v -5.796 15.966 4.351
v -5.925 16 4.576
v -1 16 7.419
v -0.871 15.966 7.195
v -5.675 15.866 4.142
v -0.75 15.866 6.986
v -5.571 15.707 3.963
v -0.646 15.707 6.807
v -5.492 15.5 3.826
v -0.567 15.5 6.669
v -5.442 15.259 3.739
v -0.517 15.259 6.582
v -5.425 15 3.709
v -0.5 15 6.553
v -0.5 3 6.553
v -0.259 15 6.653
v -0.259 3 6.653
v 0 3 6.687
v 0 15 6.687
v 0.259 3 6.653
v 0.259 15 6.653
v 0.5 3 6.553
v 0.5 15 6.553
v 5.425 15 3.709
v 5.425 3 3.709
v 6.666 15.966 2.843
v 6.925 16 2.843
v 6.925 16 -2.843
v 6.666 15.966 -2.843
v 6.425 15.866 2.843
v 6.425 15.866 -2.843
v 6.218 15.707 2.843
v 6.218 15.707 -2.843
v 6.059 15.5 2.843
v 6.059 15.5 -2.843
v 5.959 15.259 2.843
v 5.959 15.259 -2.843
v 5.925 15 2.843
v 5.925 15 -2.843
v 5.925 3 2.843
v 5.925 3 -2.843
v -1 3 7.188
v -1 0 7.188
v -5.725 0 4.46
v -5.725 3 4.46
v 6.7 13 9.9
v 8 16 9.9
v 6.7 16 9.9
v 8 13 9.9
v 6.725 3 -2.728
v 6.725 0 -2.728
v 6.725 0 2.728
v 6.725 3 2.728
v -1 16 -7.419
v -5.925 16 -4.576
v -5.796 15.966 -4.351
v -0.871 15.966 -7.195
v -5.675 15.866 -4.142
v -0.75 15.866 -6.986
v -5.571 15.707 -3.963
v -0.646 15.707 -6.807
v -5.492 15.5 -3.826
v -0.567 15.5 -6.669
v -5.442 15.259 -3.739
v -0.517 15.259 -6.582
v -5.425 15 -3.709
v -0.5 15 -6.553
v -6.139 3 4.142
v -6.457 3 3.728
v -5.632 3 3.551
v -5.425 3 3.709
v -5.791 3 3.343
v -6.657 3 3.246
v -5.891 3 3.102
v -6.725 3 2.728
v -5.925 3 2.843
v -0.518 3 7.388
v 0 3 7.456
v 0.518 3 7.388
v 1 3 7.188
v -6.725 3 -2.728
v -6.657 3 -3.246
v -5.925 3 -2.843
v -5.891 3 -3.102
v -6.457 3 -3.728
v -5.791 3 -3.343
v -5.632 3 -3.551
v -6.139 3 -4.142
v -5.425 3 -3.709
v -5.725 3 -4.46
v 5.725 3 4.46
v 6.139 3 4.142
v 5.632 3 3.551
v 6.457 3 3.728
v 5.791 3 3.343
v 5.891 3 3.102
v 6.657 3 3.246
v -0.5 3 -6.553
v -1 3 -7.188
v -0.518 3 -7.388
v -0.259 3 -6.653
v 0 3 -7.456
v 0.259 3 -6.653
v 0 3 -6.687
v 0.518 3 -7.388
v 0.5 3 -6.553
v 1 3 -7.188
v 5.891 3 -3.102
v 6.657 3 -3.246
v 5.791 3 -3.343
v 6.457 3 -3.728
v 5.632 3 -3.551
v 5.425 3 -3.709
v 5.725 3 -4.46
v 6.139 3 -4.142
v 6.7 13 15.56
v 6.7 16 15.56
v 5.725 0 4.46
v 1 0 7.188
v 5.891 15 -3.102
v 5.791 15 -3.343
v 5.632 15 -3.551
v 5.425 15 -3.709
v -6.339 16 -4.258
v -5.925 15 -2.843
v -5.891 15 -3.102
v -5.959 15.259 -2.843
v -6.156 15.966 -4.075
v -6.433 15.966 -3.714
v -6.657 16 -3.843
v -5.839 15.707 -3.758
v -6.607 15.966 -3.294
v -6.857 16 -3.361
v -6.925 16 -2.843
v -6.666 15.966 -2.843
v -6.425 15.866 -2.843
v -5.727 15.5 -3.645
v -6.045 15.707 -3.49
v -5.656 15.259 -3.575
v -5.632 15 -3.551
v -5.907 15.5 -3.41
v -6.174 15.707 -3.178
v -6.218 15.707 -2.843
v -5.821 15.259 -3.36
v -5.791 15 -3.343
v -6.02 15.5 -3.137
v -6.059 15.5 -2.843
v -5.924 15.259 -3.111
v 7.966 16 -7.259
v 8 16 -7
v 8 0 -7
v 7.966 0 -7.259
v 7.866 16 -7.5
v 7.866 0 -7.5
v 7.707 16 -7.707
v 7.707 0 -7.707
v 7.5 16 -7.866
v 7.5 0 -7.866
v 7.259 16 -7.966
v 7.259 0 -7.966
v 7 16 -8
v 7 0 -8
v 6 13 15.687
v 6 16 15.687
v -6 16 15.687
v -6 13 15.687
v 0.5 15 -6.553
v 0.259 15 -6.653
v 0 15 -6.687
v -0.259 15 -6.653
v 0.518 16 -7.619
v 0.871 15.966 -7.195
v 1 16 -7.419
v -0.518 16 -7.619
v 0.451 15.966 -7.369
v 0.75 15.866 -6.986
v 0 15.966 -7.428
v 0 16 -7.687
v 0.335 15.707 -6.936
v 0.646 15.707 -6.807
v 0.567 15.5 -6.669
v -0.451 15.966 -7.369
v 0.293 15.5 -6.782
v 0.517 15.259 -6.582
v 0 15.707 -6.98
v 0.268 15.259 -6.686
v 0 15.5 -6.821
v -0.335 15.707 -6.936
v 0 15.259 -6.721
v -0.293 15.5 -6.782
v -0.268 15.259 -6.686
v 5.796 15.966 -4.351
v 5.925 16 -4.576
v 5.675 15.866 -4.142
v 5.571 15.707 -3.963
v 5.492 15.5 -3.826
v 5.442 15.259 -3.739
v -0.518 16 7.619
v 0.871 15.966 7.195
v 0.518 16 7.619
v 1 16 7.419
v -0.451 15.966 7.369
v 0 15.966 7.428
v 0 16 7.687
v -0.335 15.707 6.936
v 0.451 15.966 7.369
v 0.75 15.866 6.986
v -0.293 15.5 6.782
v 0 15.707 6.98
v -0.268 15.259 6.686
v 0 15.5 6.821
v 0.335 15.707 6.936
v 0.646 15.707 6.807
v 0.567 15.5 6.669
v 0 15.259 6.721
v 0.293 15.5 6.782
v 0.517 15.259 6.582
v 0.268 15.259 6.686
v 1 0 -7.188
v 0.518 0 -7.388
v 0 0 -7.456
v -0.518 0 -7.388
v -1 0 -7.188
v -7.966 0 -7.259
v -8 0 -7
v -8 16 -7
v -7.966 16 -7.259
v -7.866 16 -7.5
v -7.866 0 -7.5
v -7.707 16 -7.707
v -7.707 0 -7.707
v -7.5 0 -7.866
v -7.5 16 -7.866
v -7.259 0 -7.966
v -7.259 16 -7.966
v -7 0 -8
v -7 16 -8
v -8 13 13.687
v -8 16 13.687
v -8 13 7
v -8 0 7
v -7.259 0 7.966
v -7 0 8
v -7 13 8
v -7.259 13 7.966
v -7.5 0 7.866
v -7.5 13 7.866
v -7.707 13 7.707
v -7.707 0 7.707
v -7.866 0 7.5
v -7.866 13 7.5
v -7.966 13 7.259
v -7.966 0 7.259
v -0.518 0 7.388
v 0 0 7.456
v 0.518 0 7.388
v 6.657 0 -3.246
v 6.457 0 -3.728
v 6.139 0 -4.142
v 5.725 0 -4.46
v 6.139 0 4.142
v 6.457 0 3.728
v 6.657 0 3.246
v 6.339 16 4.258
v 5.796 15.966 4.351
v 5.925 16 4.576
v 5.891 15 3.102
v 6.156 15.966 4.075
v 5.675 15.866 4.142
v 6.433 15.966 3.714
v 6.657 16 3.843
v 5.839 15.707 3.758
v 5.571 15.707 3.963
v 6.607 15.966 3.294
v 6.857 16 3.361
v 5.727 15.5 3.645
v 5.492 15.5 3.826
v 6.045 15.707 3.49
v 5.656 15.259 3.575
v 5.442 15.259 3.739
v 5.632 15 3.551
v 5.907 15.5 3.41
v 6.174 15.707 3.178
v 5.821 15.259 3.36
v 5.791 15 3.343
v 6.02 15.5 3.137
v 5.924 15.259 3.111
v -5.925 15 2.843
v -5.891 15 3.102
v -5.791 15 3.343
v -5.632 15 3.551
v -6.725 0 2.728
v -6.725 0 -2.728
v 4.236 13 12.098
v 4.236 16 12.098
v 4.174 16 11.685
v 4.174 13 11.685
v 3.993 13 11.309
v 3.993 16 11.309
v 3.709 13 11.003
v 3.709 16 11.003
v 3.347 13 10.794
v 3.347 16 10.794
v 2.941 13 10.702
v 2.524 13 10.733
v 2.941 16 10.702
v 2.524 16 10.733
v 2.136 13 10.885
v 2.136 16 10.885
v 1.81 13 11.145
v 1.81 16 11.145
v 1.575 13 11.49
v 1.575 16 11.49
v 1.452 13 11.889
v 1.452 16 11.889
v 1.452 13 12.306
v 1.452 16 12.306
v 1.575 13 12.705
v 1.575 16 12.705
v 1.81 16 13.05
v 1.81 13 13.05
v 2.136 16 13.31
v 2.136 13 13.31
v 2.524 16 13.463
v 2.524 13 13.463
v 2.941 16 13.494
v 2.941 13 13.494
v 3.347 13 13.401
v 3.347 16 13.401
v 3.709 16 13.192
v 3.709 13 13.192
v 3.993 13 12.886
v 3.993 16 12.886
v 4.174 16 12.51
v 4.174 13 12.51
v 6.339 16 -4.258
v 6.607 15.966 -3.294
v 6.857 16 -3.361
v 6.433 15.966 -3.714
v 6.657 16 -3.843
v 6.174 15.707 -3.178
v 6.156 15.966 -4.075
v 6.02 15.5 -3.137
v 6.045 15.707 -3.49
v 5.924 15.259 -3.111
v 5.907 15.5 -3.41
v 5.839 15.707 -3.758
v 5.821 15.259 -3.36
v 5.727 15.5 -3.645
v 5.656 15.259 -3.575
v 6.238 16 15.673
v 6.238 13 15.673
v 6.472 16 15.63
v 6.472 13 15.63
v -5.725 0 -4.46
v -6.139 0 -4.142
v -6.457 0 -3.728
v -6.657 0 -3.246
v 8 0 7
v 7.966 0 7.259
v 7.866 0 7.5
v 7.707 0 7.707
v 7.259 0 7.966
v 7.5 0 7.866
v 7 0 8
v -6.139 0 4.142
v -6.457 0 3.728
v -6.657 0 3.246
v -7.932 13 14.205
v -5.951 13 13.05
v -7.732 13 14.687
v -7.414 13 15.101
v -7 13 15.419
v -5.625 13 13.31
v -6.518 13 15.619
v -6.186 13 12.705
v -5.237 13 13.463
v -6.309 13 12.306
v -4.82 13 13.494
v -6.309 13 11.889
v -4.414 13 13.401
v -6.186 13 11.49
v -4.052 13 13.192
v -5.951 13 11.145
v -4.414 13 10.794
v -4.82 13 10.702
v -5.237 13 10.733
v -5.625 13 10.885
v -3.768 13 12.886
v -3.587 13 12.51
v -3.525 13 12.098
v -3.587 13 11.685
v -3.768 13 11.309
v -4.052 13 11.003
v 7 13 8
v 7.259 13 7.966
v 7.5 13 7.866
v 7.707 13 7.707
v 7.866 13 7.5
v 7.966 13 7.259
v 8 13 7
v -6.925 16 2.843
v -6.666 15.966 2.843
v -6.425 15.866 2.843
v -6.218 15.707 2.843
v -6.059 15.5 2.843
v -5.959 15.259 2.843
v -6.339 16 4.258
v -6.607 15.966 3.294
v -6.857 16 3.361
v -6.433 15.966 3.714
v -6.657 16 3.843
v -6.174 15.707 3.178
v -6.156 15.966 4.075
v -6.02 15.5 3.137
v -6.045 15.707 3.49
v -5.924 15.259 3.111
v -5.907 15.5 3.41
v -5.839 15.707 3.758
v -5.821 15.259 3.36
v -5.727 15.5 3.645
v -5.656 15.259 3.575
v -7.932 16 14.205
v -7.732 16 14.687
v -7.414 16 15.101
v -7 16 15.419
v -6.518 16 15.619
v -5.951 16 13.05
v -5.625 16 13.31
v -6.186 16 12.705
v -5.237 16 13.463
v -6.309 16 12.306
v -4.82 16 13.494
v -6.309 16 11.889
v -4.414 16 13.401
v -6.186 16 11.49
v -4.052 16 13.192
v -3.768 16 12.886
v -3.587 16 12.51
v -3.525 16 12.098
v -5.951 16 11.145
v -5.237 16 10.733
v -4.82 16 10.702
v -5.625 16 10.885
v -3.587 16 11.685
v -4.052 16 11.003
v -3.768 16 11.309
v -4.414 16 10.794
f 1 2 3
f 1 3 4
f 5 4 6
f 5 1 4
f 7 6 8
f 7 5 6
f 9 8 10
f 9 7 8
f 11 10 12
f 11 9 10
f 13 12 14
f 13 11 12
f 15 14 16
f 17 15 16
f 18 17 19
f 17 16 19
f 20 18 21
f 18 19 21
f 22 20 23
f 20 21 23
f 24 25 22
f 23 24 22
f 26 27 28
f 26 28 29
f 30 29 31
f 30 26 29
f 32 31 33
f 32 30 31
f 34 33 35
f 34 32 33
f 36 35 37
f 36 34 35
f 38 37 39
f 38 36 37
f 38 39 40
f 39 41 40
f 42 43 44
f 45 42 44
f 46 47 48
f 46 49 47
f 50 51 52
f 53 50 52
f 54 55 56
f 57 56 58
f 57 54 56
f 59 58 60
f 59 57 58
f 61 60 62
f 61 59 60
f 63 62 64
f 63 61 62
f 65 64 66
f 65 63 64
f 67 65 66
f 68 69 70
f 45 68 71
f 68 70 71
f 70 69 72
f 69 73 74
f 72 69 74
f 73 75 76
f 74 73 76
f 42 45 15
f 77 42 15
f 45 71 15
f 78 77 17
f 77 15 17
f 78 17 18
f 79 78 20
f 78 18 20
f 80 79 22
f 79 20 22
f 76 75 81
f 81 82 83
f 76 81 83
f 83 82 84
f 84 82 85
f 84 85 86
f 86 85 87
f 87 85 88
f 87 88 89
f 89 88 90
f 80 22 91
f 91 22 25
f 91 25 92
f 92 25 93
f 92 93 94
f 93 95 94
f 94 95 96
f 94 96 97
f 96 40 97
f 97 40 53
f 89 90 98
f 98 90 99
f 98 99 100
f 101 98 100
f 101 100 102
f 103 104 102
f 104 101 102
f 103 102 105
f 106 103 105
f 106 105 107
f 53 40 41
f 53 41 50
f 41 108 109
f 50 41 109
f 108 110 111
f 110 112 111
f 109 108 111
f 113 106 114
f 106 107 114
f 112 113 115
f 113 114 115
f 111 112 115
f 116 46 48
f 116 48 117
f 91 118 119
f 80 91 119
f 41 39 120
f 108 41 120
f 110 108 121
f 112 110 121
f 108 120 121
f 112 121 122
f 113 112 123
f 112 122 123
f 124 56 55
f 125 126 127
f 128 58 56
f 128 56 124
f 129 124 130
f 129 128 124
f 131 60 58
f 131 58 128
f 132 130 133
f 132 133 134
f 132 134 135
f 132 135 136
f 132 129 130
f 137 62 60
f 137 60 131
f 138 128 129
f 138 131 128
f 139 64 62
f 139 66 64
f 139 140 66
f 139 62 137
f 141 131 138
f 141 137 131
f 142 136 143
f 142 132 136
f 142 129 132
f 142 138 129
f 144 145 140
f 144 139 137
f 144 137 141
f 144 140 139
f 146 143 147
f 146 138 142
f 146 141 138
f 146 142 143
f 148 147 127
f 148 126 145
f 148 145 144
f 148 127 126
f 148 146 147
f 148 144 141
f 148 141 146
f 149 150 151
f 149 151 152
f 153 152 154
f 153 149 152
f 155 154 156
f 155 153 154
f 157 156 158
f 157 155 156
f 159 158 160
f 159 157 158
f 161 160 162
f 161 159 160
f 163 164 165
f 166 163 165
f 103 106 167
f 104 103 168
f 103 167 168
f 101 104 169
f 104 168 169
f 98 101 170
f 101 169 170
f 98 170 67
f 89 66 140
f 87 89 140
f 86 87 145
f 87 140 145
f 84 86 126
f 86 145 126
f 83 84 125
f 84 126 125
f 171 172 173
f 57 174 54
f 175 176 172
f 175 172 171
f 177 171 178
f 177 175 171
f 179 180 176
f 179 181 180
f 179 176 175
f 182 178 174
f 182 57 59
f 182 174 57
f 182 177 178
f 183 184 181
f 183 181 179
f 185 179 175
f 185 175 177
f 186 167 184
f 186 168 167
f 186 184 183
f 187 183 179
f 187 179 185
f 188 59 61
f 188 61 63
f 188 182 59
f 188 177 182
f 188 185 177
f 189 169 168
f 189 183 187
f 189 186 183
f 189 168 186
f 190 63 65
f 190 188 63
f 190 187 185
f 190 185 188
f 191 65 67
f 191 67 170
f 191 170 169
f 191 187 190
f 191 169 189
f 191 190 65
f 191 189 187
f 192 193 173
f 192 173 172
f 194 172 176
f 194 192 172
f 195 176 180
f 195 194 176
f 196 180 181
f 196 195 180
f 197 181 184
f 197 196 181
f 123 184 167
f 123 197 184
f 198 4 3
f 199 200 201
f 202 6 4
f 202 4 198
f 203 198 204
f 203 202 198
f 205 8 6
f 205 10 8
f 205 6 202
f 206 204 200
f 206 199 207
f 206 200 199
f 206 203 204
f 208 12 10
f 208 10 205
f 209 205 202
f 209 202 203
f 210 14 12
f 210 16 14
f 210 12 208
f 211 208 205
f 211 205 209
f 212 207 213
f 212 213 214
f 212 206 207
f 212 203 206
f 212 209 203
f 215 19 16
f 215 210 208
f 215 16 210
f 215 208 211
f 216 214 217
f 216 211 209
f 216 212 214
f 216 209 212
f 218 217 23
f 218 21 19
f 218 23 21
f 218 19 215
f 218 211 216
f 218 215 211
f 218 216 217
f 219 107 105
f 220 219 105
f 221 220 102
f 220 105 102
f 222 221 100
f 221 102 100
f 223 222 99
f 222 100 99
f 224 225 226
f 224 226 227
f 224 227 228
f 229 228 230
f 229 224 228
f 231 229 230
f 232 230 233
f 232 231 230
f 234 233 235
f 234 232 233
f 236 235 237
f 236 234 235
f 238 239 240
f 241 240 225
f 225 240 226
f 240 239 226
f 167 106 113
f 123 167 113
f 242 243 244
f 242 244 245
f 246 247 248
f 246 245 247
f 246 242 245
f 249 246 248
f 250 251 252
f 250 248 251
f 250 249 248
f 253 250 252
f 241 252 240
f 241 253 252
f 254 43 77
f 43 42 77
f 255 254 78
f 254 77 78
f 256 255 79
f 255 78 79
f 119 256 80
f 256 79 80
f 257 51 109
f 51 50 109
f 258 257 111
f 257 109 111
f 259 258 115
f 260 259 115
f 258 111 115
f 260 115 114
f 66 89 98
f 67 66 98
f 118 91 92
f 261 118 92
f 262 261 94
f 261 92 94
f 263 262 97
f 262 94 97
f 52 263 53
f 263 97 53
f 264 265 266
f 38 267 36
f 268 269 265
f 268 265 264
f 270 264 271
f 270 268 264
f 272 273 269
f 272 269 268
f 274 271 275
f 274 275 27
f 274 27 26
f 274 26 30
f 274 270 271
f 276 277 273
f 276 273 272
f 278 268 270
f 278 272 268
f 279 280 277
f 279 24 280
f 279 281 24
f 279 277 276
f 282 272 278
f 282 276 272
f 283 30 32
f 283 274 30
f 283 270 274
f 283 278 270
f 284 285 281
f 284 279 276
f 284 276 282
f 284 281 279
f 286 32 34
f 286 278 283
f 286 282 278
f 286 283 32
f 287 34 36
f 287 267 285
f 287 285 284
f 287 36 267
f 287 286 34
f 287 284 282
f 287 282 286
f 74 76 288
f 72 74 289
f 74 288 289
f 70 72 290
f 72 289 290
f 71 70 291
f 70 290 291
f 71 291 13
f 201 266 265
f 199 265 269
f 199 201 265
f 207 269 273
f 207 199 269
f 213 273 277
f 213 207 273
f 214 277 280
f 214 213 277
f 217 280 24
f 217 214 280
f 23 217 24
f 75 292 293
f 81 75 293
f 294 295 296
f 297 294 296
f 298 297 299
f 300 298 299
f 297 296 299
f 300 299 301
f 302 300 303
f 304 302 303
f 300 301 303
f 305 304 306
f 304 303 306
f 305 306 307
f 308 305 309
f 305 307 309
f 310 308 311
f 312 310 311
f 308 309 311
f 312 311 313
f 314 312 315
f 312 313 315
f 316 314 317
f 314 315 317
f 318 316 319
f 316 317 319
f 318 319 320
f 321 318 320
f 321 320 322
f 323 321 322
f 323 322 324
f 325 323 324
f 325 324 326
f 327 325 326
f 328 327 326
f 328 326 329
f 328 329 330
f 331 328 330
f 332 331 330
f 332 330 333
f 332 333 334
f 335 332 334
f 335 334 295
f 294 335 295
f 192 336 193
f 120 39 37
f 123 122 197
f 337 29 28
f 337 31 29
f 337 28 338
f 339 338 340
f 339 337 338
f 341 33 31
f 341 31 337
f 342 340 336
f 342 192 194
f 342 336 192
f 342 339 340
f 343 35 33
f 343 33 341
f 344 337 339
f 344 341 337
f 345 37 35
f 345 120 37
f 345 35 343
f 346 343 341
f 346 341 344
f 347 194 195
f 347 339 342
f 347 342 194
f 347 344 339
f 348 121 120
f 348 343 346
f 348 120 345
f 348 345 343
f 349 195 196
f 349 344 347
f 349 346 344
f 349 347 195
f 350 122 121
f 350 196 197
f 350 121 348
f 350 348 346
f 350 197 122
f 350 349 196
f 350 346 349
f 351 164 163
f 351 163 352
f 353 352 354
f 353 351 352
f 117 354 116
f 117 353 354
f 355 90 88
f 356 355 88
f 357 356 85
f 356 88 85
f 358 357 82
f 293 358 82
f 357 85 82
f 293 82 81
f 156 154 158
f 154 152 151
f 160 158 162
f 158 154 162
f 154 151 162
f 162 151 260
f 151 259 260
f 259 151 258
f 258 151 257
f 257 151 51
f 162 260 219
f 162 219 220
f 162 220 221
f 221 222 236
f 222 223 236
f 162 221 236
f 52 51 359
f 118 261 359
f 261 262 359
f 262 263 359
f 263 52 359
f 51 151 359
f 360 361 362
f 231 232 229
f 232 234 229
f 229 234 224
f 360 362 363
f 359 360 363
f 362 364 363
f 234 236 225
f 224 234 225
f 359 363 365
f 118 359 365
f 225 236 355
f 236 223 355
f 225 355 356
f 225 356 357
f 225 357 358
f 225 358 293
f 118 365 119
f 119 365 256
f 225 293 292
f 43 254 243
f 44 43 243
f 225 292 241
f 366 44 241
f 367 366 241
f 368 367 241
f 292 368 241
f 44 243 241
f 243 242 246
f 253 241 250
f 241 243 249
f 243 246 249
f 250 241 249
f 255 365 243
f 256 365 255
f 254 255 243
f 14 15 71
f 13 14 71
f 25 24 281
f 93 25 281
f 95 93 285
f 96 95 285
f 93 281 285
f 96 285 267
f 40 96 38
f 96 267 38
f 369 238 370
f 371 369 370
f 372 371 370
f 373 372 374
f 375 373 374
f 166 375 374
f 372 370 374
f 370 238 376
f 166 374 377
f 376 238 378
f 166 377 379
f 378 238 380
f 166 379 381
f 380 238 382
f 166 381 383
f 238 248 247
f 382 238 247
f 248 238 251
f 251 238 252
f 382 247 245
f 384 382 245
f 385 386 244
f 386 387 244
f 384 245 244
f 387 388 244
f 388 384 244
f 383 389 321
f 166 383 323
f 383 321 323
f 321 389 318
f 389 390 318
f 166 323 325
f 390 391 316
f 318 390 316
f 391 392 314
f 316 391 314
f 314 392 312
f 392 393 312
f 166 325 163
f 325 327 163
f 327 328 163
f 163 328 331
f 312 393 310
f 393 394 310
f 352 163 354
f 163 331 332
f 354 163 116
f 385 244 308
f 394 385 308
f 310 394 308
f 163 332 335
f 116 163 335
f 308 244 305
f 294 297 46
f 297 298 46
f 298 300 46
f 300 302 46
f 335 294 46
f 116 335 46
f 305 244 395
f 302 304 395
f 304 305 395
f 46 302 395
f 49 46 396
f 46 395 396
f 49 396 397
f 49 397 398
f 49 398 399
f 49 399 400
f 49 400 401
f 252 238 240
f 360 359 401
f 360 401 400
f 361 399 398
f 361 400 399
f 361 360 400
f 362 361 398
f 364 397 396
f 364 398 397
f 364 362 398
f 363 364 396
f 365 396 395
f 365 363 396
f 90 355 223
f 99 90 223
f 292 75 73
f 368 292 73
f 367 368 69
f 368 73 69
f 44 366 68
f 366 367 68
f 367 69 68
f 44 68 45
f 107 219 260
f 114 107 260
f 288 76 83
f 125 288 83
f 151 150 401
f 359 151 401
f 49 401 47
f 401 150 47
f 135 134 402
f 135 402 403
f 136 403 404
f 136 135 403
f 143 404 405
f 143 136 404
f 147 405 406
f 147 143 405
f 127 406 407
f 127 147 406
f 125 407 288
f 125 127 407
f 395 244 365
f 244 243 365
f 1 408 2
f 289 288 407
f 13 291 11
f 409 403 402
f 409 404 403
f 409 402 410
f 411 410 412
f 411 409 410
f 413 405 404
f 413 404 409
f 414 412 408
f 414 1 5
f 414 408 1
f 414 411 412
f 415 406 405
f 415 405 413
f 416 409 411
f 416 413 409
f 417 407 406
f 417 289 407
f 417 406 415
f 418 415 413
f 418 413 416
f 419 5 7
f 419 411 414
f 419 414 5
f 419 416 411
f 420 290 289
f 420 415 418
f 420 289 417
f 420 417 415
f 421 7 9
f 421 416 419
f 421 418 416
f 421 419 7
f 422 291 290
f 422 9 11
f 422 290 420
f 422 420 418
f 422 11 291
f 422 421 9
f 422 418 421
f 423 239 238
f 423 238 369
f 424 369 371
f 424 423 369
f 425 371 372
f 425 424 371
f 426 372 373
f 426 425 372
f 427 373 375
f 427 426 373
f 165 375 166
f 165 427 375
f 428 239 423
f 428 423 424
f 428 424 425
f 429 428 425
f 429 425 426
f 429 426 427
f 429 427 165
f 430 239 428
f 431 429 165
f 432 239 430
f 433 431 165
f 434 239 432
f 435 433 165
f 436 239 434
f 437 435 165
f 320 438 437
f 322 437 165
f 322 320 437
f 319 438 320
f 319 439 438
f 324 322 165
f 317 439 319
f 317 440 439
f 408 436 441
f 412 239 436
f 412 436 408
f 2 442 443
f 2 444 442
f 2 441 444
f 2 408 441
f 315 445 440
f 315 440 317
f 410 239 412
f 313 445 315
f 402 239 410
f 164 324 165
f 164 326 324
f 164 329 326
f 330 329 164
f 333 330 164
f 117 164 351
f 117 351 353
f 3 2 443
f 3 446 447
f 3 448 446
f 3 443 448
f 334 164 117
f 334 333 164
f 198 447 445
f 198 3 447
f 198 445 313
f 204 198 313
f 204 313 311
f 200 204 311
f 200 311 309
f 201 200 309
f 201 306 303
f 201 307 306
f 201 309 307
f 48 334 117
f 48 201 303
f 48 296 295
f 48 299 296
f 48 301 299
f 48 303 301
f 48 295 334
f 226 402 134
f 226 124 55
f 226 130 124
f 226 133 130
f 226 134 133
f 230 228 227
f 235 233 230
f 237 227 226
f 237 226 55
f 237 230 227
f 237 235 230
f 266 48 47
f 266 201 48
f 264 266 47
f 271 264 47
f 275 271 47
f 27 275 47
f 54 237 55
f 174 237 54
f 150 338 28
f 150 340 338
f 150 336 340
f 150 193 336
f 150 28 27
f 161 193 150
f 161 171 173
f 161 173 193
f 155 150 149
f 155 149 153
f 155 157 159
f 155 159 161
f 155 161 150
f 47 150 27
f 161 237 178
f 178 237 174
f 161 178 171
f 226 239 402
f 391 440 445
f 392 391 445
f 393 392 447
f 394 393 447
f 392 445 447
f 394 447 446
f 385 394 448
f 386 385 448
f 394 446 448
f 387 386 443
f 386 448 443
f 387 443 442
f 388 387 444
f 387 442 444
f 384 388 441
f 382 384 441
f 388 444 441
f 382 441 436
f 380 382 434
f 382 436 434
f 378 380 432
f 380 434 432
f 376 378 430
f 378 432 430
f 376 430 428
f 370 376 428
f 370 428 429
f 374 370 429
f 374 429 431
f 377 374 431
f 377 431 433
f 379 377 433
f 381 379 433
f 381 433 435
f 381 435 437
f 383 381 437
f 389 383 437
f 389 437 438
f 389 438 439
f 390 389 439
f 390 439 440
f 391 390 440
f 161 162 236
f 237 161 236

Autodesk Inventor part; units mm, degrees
ref_plane "YZ Plane" through (0, 0, 0) normal (1, 0, 0) x (0, 1, 0)
ref_plane "XZ Plane" through (0, 0, 0) normal (0, 1, 0) x (-1, 0, 0)
ref_plane "XY Plane" through (0, 0, 0) normal (0, 0, 1) x (1, 0, 0)
sketch "Skizze1" plane through (0, 0, 0) normal (0, 1, 0) x (-1, 0, 0)
  line L0 (6.725, 3.8827) -> (6.725, -3.8827)
  line L1 (6.725, -3.8827) -> (0, -7.7654)
  line L2 (0, -7.7654) -> (-6.725, -3.8827)
  line L3 (-6.725, -3.8827) -> (-6.725, 3.8827)
  line L4 (-6.725, 3.8827) -> (0, 7.7654)
  line L5 (0, 7.7654) -> (6.725, 3.8827)
  line L6 (-8, -8) -> (8, -8)
  line L7 (8, -8) -> (8, 8)
  line L8 (8, 8) -> (-8, 8)
  line L9 (-8, 8) -> (-8, -8)
  line L10 (-8, -8) -> (8, 8) construction
  line L11 (8, -8) -> (-8, 8) construction
  point P0 (0, 0)
  point P1 (0, 0)
  point P2 (-0.3096, 7.5)
  point P3 (-0.3096, -7.5)
  point P4 (0.3096, -7.5)
  point P5 (0.3096, 7.5)
  dimension "d0" = 16
  dimension "d1" = 16
  dimension "d2" = 13.45
extrude "Extrusion1" add sketch "Skizze1" along normal blind 3
fillet "Rundung1" radius 2 6 edges at (-6.725, 1.5, -3.8827) (-6.725, 1.5, 3.8827) (0, 1.5, 7.7654) (6.725, 1.5, 3.8827) (6.725, 1.5, -3.8827) (0, 1.5, -7.7654)
sketch "Skizze2" plane through (0, 3, 0) normal (0, 1, 0) x (1, 0, 0)
  line L0 (-8, 8) -> (-8, -8) projected
  line L1 (-8, -8) -> (8, -8) projected
  line L2 (8, -8) -> (8, 8) projected
  line L3 (8, 8) -> (-8, 8) projected
  line L4 (-5.725, 4.46) -> (-1, 7.188) projected
  arc A0 (1, 7.188) -> (-1, 7.188) centre (0, 5.456) ccw projected
  line L5 (1, 7.188) -> (5.725, 4.46) projected
  arc A1 (6.725, 2.728) -> (5.725, 4.46) centre (4.725, 2.728) ccw projected
  line L6 (6.725, 2.728) -> (6.725, -2.728) projected
  arc A2 (5.725, -4.46) -> (6.725, -2.728) centre (4.725, -2.728) ccw projected
  line L7 (5.725, -4.46) -> (1, -7.188) projected
  arc A3 (-1, -7.188) -> (1, -7.188) centre (0, -5.456) ccw projected
  line L8 (-1, -7.188) -> (-5.725, -4.46) projected
  arc A4 (-6.725, -2.728) -> (-5.725, -4.46) centre (-4.725, -2.728) ccw projected
  line L9 (-6.725, -2.728) -> (-6.725, 2.728) projected
  arc A5 (-5.725, 4.46) -> (-6.725, 2.728) centre (-4.725, 2.728) ccw projected
  line L10 (0, -6.8416) -> (-5.925, -3.4208)
  line L11 (-5.925, -3.4208) -> (-5.925, 3.4208)
  line L12 (-5.925, 3.4208) -> (0, 6.8416)
  line L13 (0, 6.8416) -> (5.925, 3.4208)
  line L14 (5.925, 3.4208) -> (5.925, -3.4208)
  line L15 (5.925, -3.4208) -> (0, -6.8416)
  point P0 (0, 0)
  point P1 (0, 0)
  point P2 (8, 5.7735)
  point P3 (8, -5.7735)
  point P4 (-8, -5.7735)
  point P5 (-8, 5.7735)
  point P6 (4.1436, -8)
  point P7 (-4.1436, -8)
  point P8 (4.1436, 8)
  point P9 (-4.1436, 8)
  dimension "d6" = 11.85
extrude "Extrusion2" add sketch "Skizze2" along normal blind 13 contours L3 L2 L1 L0 | L4 A0 L5 A1 L6 A2 L7 A3 L8 A4 L9 A5
fillet "Rundung2" radius 1 16 edges at (0, 9.5, 6.8416) (-5.925, 9.5, 3.4208) (-5.925, 9.5, -3.4208) (0, 9.5, -6.8416) (5.925, 9.5, -3.4208) (5.925, 9.5, 3.4208) (8, 8, -8) (-8, 8, -8) (-8, 8, 8) (8, 8, 8) (-2.9625, 16, -5.1312) (-5.925, 16, 0) (-2.9625, 16, 5.1312) (2.9625, 16, 5.1312) (5.925, 16, 0) (2.9625, 16, -5.1312)
ref_plane "Arbeitsebene1" through (0, 0, -8) normal (-1, 0, 0) x (0, 0, 1)
ref_plane "Arbeitsebene2" through (-8, 0, 0) normal (0, 0, 1) x (1, 0, 0)
sketch "Skizze3" plane through (0, 16, 0) normal (0, 1, 0) x (1, 0, 0)
  arc A0 (7, -8) -> (8, -7) centre (7, -7) ccw projected
  line L0 (8, -7) -> (8, 7) projected
  arc A1 (8, 7) -> (7, 8) centre (7, 7) ccw projected
  line L1 (7, 8) -> (-7, 8) projected
  arc A2 (-7, 8) -> (-8, 7) centre (-7, 7) ccw projected
  line L2 (-8, 7) -> (-8, -7) projected
  arc A3 (-8, -7) -> (-7, -8) centre (-7, -7) ccw projected
  line L3 (-7, -8) -> (7, -8) projected
  arc A4 (-1, -7.419) -> (1, -7.419) centre (0, -5.6869) ccw projected
  line L4 (-5.925, -4.5755) -> (-1, -7.419) projected
  arc A5 (-6.925, -2.8435) -> (-5.925, -4.5755) centre (-4.925, -2.8435) ccw projected
  line L5 (-6.925, 2.8435) -> (-6.925, -2.8435) projected
  arc A6 (-5.925, 4.5755) -> (-6.925, 2.8435) centre (-4.925, 2.8435) ccw projected
  line L6 (-1, 7.419) -> (-5.925, 4.5755) projected
  arc A7 (1, 7.419) -> (-1, 7.419) centre (0, 5.6869) ccw projected
  line L7 (5.925, 4.5755) -> (1, 7.419) projected
  arc A8 (6.925, 2.8435) -> (5.925, 4.5755) centre (4.925, 2.8435) ccw projected
  line L8 (6.925, -2.8435) -> (6.925, 2.8435) projected
  arc A9 (5.925, -4.5755) -> (6.925, -2.8435) centre (4.925, -2.8435) ccw projected
  line L9 (1, -7.419) -> (5.925, -4.5755) projected
  line L10 (-8, -5.6869) -> (8, -5.6869)
  line L11 (8, -5.6869) -> (8, -13.6869)
  line L12 (6, -15.6869) -> (-6, -15.6869)
  line L13 (-8, -13.6869) -> (-8, -5.6869)
  circle A10 centre (-4.925, -12.0977) radius 1.4
  circle A11 centre (2.836, -12.0977) radius 1.4
  arc A12 (-8, -13.6869) -> (-6, -15.6869) centre (-6, -13.6869) ccw
  arc A13 (6, -15.6869) -> (8, -13.6869) centre (6, -13.6869) ccw
  point P0 (0, 0)
  point P1 (8, -15.6869)
  point P2 (8, -7)
  dimension "d10" = 10
  dimension "d11" = 2.8
  dimension "d12" = 2.8
  dimension "d13" = 2
extrude "Extrusion3" add sketch "Skizze3" against normal blind 3 contours A0 L11 A13 L12 A12 L13 A3 L3
sketch "Skizze4" plane through (0, 0, 0) normal (0, -1, 0) x (1, 0, 0)
  line L0 (12.8, 30) -> (12.8, 10) projected
  line L1 (12.8, 30) -> (6.8, 30) projected
  line L2 (6.8, 10) -> (6.8, 30) projected
  line L3 (12.8, 10) -> (6.8, 10) projected
  line L4 (6.7, 30.1) -> (12.9, 30.1)
  line L5 (12.9, 30.1) -> (12.9, 9.9)
  line L6 (12.9, 9.9) -> (6.7, 9.9)
  line L7 (6.7, 9.9) -> (6.7, 30.1)
  point P0 (0, 0)
  dimension "d16" = 0.1
extrude "Extrusion4" cut sketch "Skizze4" against normal through all contours L0 L3 L2 L1 | L4 L5 L6 L7
sketch "Skizze5" plane through (0, 0, 0) normal (0, -1, 0) x (1, 0, 0)
  line L0 (-4.75, -4.75) -> (4.75, -4.75)
  line L1 (4.75, -4.75) -> (4.75, 4.75)
  line L2 (4.75, 4.75) -> (-4.75, 4.75)
  line L3 (-4.75, 4.75) -> (-4.75, -4.75)
  line L4 (-4.75, -4.75) -> (4.75, 4.75) construction
  line L5 (4.75, -4.75) -> (-4.75, 4.75) construction
  point P0 (0, 0)
  dimension "d19" = 9.5
  dimension "d20" = 9.5
properties part number "30_Laser_to_M12Adapter"
